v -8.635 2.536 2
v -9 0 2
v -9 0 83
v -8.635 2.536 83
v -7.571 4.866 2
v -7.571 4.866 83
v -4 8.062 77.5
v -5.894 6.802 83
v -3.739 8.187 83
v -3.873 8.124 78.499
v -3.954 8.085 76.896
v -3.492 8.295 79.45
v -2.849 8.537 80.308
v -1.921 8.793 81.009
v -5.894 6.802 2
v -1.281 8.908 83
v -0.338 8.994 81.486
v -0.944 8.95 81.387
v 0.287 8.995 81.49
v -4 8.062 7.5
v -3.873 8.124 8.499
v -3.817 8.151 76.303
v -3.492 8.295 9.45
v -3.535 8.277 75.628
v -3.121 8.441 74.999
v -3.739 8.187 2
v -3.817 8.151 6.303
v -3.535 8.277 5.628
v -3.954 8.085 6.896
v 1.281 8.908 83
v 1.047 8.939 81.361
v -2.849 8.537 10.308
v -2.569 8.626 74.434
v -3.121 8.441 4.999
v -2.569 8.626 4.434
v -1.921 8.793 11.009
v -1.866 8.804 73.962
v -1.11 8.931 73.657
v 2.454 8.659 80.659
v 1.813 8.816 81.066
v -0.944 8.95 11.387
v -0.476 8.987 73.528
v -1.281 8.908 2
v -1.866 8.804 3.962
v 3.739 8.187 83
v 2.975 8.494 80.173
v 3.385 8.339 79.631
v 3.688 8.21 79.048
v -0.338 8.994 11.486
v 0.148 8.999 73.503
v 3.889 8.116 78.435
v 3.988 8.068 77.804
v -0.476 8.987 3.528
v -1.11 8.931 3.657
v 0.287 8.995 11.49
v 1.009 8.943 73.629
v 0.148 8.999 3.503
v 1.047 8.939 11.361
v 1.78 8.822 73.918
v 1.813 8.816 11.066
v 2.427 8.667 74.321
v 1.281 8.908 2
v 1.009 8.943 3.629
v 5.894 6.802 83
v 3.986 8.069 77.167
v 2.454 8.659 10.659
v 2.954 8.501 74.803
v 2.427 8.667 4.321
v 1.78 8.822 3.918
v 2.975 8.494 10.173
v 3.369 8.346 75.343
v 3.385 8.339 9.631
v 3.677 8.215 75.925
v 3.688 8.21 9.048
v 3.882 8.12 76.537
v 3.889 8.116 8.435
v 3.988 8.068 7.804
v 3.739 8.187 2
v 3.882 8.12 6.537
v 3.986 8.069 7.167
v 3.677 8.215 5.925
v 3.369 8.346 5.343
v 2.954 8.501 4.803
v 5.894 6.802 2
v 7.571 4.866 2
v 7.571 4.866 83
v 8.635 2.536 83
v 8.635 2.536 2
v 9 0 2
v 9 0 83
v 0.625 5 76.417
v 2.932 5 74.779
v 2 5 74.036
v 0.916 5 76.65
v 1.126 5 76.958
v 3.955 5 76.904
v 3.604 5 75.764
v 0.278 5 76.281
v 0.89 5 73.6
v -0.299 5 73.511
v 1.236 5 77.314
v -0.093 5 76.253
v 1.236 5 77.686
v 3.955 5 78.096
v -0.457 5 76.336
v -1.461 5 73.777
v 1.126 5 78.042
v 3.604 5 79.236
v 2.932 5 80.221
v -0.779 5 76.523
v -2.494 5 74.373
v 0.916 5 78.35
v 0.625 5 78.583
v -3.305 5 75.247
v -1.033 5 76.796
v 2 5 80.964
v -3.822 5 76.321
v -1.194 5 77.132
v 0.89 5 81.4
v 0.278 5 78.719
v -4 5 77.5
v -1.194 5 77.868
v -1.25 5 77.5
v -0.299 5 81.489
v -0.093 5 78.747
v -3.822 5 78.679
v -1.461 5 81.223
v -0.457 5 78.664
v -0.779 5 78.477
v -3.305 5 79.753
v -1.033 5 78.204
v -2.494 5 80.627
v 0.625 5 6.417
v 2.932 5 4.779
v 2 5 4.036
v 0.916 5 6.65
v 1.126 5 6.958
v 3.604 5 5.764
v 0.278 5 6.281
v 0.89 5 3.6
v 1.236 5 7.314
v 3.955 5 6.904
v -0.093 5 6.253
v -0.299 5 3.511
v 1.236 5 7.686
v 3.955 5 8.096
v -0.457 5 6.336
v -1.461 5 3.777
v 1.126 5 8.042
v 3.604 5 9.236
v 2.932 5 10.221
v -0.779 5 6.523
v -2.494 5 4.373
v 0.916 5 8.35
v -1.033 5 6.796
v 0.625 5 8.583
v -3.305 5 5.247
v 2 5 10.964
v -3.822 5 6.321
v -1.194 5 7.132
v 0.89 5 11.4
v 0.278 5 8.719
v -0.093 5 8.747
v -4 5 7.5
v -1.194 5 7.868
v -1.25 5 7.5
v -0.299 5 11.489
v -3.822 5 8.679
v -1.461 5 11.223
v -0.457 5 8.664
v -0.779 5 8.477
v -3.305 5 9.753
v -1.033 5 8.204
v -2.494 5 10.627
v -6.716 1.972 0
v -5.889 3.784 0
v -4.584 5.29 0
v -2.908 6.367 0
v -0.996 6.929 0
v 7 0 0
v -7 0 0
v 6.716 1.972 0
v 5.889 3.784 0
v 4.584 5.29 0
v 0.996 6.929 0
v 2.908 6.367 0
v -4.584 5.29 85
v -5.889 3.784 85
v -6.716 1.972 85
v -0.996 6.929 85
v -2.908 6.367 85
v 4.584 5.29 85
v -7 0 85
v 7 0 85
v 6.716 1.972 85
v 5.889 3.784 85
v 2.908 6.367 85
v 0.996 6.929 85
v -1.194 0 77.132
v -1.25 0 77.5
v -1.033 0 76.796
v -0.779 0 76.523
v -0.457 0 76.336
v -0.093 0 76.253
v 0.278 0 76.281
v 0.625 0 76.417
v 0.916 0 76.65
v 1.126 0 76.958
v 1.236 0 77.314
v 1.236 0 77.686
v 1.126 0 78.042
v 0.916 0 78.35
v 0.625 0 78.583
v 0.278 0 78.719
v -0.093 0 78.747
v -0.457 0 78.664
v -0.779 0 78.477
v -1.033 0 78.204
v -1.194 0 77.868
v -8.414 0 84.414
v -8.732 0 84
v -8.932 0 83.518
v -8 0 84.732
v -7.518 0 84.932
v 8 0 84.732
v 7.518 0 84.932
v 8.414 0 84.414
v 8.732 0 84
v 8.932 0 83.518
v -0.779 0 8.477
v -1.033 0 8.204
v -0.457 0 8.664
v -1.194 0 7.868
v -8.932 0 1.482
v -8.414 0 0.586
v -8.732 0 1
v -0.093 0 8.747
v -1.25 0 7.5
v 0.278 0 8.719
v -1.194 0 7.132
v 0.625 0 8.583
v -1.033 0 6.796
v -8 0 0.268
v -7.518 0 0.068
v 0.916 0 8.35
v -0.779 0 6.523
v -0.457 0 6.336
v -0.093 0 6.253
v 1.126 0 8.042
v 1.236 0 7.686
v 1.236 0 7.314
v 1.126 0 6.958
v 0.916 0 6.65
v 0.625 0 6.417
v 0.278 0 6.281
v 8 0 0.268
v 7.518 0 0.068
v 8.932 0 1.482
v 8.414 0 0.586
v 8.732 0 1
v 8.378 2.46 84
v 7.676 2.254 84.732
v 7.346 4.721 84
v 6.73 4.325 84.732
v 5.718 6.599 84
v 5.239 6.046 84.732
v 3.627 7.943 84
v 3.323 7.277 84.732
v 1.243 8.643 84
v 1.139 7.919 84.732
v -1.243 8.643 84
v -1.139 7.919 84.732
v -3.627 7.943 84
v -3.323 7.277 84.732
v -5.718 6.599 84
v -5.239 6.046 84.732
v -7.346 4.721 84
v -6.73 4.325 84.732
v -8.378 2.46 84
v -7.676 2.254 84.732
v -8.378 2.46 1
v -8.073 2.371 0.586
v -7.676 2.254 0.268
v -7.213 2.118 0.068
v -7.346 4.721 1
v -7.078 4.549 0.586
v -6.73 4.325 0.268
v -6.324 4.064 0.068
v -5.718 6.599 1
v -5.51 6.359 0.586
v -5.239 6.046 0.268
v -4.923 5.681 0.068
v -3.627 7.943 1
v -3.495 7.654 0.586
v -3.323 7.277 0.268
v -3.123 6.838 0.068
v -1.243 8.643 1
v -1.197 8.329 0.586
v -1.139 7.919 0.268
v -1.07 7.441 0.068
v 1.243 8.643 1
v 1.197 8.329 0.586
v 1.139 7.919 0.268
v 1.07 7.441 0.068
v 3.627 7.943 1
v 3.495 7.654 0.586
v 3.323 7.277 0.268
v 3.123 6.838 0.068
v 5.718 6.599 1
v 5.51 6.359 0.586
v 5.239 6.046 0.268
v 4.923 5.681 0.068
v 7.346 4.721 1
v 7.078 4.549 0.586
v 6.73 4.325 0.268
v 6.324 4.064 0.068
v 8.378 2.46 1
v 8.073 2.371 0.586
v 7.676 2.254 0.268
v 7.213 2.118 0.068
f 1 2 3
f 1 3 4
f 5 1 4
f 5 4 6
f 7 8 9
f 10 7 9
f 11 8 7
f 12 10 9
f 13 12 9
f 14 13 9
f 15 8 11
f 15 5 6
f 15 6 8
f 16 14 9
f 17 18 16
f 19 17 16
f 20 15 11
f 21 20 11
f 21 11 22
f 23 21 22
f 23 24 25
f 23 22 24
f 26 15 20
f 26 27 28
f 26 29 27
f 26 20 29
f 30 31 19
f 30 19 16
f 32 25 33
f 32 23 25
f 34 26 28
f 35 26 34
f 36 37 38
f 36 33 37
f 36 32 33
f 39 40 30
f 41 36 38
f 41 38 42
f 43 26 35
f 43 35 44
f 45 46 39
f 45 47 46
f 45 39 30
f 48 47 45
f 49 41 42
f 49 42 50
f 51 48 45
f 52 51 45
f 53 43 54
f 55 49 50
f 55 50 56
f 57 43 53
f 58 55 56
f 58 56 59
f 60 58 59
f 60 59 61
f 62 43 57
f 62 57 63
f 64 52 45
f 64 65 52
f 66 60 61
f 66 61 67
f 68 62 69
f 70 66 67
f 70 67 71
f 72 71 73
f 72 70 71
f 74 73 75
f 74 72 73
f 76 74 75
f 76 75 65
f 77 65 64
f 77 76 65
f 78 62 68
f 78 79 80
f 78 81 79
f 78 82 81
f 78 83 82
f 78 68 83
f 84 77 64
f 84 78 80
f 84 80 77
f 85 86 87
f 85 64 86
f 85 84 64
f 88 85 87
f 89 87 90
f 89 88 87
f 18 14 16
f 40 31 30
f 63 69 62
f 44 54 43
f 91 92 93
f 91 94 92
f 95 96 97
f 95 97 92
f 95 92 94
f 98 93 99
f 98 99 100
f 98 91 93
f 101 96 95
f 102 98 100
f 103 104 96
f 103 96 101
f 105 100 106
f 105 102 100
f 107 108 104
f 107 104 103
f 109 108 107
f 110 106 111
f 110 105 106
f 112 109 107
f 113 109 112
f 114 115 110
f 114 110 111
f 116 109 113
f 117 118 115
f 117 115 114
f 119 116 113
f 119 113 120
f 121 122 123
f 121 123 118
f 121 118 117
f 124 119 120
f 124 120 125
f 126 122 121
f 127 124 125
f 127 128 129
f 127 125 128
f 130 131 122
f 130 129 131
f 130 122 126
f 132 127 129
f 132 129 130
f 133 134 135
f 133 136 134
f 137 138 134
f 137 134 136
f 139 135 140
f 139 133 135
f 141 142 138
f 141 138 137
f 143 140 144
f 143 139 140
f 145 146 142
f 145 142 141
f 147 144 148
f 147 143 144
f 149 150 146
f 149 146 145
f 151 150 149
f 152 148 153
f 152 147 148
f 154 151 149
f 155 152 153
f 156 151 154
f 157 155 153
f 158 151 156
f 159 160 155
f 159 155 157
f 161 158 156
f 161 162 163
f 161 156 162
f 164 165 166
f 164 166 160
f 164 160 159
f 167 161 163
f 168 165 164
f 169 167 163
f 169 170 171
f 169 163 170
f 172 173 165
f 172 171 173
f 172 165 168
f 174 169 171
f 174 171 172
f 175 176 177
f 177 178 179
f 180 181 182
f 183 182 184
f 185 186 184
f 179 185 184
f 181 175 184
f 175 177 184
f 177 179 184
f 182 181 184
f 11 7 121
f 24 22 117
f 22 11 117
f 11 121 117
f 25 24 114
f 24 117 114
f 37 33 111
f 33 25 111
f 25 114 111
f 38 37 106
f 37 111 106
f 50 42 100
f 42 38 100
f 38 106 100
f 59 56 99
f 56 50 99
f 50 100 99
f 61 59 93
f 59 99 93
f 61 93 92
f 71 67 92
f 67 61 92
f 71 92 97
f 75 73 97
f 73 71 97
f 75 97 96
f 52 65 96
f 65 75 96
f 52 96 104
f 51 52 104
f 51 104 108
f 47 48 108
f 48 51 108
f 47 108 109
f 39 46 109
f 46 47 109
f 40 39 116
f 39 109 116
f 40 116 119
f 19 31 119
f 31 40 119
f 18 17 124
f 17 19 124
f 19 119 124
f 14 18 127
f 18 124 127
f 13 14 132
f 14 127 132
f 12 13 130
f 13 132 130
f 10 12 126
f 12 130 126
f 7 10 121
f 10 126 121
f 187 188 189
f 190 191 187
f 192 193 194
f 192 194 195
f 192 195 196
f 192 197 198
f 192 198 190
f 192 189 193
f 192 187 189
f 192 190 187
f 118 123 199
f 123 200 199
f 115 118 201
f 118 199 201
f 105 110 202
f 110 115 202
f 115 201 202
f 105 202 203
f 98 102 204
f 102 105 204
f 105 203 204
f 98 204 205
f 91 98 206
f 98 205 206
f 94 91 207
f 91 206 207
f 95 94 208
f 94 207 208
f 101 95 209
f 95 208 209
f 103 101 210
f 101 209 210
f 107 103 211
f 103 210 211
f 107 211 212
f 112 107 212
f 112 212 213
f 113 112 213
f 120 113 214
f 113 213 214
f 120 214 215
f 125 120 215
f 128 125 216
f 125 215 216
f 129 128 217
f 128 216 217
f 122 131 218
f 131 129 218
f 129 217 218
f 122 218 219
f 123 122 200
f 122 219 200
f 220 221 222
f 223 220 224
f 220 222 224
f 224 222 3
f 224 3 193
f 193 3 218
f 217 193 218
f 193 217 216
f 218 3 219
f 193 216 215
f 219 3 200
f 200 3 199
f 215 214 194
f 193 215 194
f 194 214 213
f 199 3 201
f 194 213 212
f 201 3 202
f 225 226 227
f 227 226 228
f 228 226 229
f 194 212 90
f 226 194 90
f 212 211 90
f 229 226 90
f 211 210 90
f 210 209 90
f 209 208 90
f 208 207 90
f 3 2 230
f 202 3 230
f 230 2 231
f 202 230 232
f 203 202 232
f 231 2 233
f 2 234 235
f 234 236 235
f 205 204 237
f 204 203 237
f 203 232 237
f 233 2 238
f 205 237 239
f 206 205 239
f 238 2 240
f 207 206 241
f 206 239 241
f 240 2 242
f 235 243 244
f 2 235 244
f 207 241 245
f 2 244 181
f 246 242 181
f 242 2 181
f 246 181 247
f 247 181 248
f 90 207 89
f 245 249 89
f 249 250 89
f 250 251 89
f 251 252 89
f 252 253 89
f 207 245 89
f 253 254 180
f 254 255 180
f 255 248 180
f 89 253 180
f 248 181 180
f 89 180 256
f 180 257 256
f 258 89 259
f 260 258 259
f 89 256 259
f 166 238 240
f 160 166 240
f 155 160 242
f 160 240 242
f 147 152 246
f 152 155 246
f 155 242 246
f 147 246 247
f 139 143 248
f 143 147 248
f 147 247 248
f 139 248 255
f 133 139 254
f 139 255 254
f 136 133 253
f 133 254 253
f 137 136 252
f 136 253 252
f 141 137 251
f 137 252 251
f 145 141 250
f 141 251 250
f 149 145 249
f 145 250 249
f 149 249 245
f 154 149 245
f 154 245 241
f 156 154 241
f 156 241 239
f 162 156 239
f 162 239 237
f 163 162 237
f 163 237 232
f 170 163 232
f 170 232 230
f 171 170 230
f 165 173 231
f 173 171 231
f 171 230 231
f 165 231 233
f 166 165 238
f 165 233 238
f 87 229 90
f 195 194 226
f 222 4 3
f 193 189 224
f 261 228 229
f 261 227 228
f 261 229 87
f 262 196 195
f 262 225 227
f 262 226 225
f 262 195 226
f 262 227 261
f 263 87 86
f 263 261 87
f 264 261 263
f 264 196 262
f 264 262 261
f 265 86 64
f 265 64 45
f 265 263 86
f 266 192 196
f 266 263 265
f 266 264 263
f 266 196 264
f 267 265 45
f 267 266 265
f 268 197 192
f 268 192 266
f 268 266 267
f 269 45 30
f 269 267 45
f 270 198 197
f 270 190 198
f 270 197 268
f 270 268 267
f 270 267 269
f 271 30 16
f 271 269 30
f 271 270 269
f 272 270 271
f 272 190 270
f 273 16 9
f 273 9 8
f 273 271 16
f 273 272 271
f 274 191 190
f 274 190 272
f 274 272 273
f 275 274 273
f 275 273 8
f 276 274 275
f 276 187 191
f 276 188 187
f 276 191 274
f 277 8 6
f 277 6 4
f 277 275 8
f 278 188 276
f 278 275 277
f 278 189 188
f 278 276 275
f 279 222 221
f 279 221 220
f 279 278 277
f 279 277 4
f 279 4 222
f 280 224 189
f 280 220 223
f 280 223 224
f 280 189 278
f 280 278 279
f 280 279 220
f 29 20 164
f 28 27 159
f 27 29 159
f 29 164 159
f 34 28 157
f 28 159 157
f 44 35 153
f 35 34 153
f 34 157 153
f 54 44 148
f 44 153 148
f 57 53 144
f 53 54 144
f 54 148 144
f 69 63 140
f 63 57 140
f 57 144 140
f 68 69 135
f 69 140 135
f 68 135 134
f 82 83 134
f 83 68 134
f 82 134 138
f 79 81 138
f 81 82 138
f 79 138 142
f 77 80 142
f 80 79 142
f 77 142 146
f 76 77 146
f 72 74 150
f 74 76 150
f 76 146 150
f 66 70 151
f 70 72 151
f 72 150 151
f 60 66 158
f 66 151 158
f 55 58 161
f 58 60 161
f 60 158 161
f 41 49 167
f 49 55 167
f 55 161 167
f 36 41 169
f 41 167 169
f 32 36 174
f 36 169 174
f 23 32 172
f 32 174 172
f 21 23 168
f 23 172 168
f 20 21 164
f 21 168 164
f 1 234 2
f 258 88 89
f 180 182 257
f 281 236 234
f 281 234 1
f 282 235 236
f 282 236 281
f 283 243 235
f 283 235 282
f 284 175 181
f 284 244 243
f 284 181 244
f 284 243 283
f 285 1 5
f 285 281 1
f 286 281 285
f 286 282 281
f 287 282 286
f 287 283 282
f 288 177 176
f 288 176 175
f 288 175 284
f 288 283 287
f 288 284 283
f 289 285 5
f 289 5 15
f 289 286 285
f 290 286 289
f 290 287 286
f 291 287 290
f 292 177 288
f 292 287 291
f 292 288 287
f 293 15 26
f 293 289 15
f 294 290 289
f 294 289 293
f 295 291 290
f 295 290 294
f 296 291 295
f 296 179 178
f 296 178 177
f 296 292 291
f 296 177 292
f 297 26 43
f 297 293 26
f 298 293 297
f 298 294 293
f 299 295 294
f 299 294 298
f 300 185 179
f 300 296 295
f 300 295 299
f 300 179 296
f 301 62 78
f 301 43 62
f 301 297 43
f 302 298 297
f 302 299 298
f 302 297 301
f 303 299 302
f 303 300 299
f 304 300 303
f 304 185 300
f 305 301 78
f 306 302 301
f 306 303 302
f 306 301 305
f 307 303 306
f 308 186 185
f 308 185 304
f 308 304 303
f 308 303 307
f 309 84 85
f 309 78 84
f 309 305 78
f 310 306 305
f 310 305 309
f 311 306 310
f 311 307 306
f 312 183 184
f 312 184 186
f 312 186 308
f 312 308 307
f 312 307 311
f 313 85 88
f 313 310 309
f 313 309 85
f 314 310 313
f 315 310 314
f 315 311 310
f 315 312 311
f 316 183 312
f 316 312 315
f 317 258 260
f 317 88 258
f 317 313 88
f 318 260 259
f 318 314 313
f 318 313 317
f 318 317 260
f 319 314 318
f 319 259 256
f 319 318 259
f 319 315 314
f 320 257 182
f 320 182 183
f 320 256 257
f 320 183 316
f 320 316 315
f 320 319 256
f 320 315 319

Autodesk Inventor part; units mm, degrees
ref_plane "YZ Plane" through (0, 0, 0) normal (1, 0, 0) x (0, 1, 0)
ref_plane "XZ Plane" through (0, 0, 0) normal (0, 1, 0) x (-1, 0, 0)
ref_plane "XY Plane" through (0, 0, 0) normal (0, 0, 1) x (1, 0, 0)
sketch "Sketch3" plane through (0, 0, 0) normal (0, 0, 1) x (1, 0, 0)
  line L0 (0, -1.8) -> (0, 10.8) construction
  line L1 (-12.6, 0) -> (12.6, 0) construction
  line L2 (-9, 0) -> (9, 0)
  line L3 (9, 0) -> (9, 0)
  arc A0 (9, 0) -> (-9, 0) centre (0, 0) ccw
  line L4 (-9, 0) -> (-9, 0)
  dimension "d20" = 18
  dimension "d21" = 0
extrude "Extrusion3" add sketch "Sketch3" along normal blind 85
fillet "Fillet1" radius 2 2 edges at (0, 9, 0) (0, 9, 85)
sketch "Sketch4" plane through (0, 0, 0) normal (0, 1, 0) x (-1, 0, 0)
  circle A0 centre (0, 77.5) radius 1.25
  circle A1 centre (0, 7.5) radius 1.25
  circle A2 centre (0, 7.5) radius 4
  circle A3 centre (0, 77.5) radius 4
  line L0 (9, 42.5) -> (-9, 42.5) construction
  arc A4 (-7, 85) -> (-9, 83) centre (-7, 83) ccw projected
  line L1 (-7, 85) -> (7, 85) projected
  arc A5 (9, 83) -> (7, 85) centre (7, 83) ccw projected
  line L2 (9, 83) -> (9, 2) projected
  arc A6 (7, 0) -> (9, 2) centre (7, 2) ccw projected
  line L3 (7, 0) -> (-7, 0) projected
  arc A7 (-9, 2) -> (-7, 0) centre (-7, 2) ccw projected
  line L4 (-9, 2) -> (-9, 83) projected
  point P0 (0, 0)
  dimension "d25" = 8
  dimension "d26" = 2.5
  dimension "d31" = 70
extrude "Extrusion4" cut sketch "Sketch4" along normal blind 85 contours A0 | A1 | A2 | A3
extrude "Extrusion5" add sketch "Sketch4" along normal blind 5 from surface at 0 contours A2 | A3
properties part number "BodySiliconeRubber"
